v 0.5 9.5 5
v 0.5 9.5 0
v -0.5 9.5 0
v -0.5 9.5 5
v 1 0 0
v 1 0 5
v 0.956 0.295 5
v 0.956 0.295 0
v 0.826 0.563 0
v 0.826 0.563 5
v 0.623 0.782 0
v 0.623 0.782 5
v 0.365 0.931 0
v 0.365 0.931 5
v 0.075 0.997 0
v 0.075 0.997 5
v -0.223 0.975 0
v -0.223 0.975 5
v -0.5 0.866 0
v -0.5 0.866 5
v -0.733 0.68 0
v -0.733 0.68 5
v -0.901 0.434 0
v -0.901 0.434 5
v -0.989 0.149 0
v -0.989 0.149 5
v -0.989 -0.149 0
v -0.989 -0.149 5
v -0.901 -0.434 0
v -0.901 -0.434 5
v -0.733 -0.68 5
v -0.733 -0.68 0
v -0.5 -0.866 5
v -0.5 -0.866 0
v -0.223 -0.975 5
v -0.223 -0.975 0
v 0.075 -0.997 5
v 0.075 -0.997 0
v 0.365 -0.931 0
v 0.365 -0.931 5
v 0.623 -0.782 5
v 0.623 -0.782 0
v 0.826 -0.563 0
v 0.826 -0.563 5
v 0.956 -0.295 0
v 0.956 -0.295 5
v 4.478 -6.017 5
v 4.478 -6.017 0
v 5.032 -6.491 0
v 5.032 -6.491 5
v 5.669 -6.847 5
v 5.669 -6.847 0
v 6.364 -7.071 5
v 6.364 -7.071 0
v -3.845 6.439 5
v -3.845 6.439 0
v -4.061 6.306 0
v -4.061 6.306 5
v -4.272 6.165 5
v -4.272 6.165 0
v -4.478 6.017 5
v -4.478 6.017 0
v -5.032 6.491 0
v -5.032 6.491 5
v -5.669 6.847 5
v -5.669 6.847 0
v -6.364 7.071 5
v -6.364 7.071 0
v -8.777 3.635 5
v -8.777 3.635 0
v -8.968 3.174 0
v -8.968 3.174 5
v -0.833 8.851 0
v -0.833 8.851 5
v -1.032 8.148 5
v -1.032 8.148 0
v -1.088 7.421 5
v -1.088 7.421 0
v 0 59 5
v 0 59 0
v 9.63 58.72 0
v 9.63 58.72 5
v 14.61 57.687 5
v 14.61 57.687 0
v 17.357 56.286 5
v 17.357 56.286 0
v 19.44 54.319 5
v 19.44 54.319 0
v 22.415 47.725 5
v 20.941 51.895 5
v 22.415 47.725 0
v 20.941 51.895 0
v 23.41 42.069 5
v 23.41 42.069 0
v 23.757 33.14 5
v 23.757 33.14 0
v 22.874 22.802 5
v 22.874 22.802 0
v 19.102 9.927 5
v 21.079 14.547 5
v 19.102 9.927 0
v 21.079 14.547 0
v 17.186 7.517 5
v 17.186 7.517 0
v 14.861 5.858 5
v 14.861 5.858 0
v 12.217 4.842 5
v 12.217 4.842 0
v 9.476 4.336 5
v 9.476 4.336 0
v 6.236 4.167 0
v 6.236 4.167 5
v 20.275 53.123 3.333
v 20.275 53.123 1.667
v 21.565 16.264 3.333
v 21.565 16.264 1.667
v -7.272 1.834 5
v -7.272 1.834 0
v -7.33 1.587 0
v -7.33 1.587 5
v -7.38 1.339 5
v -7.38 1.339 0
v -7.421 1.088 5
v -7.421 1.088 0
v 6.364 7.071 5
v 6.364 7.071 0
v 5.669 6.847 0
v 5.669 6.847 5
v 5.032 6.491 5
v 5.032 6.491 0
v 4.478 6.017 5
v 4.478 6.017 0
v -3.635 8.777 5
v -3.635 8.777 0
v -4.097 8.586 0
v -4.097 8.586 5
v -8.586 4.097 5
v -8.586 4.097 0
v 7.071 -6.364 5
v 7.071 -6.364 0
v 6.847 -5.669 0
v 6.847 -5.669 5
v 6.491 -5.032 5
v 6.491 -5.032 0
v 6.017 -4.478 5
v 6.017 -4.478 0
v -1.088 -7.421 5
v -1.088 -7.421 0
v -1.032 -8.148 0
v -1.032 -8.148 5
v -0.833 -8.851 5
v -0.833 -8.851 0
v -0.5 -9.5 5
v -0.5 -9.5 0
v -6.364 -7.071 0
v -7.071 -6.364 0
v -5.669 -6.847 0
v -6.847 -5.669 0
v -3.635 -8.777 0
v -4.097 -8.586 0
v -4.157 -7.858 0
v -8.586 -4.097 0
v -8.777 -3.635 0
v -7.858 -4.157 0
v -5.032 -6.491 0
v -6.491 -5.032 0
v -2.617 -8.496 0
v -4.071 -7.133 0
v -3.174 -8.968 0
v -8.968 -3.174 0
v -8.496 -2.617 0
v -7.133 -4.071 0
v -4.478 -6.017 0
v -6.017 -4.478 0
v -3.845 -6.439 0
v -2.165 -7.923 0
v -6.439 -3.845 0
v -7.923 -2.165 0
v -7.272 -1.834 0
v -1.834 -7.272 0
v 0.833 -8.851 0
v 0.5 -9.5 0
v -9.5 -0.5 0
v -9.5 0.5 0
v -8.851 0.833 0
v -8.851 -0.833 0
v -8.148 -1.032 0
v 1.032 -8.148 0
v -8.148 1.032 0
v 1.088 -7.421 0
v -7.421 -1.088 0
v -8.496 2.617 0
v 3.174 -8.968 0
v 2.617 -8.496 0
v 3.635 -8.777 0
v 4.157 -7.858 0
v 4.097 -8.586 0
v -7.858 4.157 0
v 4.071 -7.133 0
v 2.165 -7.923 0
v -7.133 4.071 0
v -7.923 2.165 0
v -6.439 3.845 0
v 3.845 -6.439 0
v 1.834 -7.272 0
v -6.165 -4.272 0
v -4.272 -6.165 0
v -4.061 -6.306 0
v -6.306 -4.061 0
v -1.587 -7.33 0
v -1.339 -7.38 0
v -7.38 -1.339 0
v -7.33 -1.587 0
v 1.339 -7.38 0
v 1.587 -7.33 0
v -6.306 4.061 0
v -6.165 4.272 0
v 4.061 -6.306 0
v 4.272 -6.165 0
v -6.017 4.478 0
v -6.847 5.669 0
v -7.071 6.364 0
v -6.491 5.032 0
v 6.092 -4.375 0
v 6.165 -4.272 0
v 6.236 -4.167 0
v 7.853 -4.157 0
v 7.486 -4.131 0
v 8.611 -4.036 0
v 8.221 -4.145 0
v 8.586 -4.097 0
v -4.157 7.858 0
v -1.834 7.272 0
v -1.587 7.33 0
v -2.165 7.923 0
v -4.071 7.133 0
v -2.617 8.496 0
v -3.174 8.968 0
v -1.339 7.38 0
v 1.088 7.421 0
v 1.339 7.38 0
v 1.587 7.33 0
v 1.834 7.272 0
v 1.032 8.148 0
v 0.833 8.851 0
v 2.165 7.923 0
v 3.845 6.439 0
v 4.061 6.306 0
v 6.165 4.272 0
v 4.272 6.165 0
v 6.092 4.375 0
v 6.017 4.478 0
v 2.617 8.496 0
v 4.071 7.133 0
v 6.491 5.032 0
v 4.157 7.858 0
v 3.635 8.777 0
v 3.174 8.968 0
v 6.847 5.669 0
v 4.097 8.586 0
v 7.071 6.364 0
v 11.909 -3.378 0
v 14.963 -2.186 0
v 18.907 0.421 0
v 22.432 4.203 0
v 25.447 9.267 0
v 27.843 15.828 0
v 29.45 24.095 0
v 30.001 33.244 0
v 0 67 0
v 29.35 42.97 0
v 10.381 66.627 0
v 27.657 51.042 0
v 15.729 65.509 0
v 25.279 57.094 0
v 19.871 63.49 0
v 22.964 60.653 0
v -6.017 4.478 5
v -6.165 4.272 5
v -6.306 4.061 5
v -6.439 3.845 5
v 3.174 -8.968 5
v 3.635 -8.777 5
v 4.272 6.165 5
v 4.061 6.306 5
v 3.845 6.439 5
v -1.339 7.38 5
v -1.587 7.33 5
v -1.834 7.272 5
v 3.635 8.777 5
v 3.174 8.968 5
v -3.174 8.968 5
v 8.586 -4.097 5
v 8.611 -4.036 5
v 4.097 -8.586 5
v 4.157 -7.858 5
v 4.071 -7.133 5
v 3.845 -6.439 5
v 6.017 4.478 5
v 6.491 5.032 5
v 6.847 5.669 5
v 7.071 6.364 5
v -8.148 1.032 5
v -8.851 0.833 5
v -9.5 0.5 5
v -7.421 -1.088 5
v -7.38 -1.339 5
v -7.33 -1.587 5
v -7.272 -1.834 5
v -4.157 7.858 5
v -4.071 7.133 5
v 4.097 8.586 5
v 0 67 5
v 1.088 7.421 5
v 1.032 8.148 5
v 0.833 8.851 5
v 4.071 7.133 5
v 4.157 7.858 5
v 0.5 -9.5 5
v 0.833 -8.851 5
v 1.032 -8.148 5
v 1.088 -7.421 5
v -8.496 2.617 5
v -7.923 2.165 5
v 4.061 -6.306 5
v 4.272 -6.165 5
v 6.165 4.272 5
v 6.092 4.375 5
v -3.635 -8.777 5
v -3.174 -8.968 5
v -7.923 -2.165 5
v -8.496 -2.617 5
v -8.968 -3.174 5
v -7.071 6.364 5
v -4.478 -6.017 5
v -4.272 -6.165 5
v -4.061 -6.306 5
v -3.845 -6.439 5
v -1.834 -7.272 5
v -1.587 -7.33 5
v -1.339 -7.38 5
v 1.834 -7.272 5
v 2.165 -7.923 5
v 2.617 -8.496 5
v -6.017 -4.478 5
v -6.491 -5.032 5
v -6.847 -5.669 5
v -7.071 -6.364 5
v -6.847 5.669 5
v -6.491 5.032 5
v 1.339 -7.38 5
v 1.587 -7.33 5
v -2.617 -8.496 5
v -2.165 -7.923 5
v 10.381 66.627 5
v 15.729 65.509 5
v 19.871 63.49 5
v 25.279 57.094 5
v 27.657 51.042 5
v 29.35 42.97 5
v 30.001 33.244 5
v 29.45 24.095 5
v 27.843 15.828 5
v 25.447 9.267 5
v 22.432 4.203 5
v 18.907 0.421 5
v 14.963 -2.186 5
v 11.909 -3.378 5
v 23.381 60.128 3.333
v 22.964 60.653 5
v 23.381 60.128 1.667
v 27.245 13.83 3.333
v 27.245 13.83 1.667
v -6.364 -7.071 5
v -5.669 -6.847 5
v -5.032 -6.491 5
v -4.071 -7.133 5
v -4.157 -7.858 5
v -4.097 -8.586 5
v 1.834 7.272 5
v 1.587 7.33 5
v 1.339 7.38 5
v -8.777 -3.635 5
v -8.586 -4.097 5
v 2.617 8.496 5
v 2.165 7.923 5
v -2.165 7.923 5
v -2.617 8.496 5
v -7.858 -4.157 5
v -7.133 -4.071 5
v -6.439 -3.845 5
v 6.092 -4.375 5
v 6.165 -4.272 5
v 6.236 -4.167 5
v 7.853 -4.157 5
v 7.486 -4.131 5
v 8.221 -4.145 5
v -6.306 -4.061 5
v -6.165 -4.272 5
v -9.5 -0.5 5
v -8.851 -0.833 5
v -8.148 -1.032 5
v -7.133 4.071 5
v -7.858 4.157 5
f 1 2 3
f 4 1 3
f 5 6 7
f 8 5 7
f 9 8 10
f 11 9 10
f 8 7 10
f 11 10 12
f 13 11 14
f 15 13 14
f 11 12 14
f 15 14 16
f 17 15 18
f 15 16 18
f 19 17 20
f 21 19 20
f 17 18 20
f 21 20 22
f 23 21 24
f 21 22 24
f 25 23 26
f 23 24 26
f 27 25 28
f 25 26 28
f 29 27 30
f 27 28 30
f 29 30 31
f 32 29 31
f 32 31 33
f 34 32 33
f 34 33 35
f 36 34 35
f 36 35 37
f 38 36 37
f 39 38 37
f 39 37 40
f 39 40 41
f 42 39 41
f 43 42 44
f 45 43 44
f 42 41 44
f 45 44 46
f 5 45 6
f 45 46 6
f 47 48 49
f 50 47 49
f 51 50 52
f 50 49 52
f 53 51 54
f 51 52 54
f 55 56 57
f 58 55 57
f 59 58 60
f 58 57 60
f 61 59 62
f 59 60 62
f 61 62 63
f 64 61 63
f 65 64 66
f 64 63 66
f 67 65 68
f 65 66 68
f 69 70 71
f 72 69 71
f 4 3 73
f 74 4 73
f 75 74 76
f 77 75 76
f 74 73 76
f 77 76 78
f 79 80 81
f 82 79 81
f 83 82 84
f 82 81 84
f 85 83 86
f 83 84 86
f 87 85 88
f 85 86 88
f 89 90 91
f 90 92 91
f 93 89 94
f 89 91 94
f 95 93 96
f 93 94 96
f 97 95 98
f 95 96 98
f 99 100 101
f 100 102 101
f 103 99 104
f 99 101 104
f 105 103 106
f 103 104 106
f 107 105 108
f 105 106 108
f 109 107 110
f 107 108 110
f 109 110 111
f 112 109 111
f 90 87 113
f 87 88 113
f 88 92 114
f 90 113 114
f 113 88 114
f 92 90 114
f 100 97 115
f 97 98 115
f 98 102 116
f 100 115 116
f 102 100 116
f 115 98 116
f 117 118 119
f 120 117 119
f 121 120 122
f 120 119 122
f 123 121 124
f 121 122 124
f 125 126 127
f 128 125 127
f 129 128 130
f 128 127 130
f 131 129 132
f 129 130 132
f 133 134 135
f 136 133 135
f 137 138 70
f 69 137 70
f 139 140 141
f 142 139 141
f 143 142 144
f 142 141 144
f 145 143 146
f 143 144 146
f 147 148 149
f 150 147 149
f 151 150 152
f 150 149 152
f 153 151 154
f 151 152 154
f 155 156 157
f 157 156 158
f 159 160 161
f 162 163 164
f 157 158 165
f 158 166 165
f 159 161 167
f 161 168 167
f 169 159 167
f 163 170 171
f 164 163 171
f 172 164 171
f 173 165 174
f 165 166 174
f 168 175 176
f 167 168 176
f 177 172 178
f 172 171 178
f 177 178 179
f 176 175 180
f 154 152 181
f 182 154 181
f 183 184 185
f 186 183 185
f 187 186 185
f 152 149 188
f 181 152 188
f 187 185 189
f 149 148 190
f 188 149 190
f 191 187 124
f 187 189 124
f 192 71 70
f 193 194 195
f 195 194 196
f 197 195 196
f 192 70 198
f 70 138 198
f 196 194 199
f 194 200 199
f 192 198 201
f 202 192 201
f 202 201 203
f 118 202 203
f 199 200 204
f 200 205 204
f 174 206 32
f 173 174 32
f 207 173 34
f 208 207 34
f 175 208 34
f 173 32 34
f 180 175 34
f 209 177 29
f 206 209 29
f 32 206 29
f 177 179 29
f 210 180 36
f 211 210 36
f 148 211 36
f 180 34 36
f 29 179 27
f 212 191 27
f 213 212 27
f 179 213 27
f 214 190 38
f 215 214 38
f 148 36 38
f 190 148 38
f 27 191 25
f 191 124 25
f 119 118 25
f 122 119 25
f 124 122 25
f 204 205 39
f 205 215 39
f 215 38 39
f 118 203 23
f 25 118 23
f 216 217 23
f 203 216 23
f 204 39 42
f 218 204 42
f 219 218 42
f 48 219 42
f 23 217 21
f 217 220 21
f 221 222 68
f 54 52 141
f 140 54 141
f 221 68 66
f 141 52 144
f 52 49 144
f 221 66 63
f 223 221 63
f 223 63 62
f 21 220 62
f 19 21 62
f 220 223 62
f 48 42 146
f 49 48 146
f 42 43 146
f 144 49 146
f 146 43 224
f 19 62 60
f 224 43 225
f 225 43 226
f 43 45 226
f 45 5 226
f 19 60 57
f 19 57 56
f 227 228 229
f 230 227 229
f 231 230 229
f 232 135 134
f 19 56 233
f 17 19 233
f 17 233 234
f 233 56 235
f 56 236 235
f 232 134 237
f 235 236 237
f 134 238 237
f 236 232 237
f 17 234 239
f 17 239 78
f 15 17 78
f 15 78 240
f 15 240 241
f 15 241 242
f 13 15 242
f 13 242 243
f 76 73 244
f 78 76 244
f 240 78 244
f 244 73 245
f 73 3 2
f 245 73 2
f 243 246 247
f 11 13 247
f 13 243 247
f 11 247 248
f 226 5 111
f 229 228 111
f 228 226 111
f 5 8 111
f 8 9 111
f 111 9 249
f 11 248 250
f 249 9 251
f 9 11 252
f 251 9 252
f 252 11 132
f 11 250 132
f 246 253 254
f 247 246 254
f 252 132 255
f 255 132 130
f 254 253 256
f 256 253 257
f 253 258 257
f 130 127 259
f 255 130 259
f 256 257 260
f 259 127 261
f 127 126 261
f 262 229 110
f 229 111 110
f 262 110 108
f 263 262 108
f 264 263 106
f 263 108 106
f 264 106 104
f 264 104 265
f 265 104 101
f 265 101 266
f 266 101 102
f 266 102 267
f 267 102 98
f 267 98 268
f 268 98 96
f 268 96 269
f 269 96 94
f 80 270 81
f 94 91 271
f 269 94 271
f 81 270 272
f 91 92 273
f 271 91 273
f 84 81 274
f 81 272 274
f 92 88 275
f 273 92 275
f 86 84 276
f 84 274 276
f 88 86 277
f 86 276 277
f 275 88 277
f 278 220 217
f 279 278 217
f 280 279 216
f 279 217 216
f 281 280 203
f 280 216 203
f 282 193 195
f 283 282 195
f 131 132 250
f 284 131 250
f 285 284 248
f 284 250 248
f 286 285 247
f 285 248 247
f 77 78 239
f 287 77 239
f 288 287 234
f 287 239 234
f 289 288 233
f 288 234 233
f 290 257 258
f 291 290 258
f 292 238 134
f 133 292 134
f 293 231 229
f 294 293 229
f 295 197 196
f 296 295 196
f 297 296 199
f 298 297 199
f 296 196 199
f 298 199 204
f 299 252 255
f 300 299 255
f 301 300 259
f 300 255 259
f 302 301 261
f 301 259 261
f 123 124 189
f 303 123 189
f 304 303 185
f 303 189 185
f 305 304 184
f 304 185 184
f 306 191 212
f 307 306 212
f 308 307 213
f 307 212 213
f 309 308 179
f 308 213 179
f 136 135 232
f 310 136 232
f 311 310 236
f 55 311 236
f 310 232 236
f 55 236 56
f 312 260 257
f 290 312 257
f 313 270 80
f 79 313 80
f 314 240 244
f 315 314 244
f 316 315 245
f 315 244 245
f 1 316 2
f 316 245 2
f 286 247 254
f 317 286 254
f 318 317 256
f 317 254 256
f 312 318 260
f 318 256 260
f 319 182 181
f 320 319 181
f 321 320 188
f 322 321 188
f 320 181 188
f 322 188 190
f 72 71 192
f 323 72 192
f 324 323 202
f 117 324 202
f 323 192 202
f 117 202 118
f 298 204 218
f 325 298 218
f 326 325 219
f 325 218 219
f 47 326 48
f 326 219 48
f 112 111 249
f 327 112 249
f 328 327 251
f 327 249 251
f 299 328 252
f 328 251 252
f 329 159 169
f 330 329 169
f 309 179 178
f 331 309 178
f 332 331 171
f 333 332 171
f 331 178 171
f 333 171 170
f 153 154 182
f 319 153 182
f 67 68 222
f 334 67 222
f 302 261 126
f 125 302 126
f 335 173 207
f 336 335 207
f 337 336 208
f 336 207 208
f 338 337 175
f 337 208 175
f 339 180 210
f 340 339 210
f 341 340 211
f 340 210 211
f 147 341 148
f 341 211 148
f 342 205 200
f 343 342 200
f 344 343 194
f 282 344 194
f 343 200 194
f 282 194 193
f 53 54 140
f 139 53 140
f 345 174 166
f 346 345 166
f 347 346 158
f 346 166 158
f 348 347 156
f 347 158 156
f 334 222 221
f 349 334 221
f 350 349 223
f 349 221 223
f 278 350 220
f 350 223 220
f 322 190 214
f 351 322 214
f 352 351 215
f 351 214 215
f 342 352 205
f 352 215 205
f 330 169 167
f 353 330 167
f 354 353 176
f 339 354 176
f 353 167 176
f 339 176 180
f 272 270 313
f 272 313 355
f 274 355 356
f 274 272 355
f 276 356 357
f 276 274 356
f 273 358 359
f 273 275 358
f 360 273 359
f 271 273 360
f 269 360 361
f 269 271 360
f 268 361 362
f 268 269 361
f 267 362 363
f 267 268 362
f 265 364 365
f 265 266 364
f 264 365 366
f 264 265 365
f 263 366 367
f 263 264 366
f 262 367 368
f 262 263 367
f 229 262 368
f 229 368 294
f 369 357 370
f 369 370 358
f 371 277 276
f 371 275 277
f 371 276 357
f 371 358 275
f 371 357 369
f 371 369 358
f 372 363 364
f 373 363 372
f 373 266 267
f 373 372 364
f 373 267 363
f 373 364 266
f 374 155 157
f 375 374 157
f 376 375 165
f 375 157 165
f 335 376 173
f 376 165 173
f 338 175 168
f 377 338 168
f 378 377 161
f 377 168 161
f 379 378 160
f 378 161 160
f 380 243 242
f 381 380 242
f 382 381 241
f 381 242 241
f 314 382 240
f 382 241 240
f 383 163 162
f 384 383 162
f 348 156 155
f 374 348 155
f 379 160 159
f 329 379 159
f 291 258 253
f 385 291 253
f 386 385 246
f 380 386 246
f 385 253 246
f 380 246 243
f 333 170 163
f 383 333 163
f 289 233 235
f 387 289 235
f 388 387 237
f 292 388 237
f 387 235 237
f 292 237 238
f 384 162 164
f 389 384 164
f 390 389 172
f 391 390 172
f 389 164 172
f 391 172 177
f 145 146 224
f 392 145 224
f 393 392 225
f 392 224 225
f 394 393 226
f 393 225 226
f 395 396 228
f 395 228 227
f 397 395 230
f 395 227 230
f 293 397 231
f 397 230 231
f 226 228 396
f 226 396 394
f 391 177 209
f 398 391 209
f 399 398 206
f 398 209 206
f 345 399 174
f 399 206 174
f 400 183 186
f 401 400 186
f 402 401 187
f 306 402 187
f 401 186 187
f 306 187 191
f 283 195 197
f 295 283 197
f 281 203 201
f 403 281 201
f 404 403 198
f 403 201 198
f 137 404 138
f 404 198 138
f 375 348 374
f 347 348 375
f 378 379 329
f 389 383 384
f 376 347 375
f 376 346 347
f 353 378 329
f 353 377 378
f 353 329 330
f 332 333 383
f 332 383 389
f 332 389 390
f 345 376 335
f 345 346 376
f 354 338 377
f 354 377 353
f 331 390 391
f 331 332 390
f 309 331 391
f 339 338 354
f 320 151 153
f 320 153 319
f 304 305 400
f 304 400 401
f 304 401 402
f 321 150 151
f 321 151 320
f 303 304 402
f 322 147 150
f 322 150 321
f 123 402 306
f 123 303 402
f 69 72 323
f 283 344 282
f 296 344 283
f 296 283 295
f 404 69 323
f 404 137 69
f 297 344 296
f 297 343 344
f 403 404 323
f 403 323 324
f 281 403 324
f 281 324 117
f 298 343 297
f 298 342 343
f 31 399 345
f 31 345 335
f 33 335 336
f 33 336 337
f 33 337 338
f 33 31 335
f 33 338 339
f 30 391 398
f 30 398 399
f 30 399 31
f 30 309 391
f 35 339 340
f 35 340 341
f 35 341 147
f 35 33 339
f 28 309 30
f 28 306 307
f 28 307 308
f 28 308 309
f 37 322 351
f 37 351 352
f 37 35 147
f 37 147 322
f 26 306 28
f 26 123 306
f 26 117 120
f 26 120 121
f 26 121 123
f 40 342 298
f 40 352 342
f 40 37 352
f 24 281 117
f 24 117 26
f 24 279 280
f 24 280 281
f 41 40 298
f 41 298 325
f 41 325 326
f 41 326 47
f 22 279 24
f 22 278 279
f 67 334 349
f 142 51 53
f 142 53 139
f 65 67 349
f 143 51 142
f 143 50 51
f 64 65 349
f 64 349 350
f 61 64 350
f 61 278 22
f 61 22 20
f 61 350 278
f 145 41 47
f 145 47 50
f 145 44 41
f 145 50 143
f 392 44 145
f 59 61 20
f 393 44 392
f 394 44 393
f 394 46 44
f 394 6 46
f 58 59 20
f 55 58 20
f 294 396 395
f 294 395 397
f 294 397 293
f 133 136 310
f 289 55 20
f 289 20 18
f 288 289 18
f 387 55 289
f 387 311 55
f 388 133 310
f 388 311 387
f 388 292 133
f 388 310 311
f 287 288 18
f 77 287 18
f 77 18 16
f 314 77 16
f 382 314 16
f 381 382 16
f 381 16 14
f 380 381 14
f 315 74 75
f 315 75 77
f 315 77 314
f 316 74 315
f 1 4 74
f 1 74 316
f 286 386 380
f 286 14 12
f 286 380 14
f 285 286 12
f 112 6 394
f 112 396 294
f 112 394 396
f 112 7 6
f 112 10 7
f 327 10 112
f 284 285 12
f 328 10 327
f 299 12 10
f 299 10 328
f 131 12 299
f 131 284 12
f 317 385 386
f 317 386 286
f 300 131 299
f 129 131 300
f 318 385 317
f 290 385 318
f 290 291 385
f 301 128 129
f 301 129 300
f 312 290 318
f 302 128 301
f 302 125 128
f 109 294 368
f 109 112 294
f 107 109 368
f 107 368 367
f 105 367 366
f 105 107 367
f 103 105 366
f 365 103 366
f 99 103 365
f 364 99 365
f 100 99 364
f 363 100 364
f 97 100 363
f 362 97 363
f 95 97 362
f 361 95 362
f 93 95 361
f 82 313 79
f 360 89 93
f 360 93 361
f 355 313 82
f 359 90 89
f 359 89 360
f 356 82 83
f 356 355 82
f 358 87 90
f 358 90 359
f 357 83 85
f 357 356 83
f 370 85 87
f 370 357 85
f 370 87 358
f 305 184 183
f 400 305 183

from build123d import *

# Parameters (mm, degrees)
F1_DEPTH = 5
F2_R     = 1
F3_DEPTH = 5
F5_DEPTH = 5


with BuildPart() as f1:
    # F0 (on Top) → F1 (new body)
    with BuildSketch(Plane.XY):
        with BuildLine():
            ThreePointArc((7.4206173165, -1.0883191822), (7.4801280027, -0.5456052265), (7.5, 0))
            ThreePointArc((7.5, 0), (7.4801280027, 0.5456052265), (7.4206173165, 1.0883191822))
            ThreePointArc((7.4206173165, 1.0883191822), (7.355889603, 1.4631774151), (7.2722381774, 1.8342714877))
            ThreePointArc((7.2722381774, 1.8342714877), (6.9290964938, 2.8701257427), (6.4392747372, 3.8452231222))
            ThreePointArc((6.4392747372, 3.8452231222), (6.2360220923, 4.1667767476), (6.0167266989, 4.4776109513))
            ThreePointArc((6.0167266989, 4.4776109513), (5.3033008589, 5.3033008589), (4.4776109513, 6.0167266989))
            ThreePointArc((4.4776109513, 6.0167266989), (4.1667767476, 6.2360220923), (3.8452231222, 6.4392747372))
            ThreePointArc((3.8452231222, 6.4392747372), (2.8701257427, 6.9290964938), (1.8342714877, 7.2722381774))
            ThreePointArc((1.8342714877, 7.2722381774), (1.4631774151, 7.355889603), (1.0883191822, 7.4206173165))
            ThreePointArc((1.0883191822, 7.4206173165), (0.5456052265, 7.4801280027), (0, 7.5))
            ThreePointArc((0, 7.5), (-0.5456052265, 7.4801280027), (-1.0883191822, 7.4206173165))
            ThreePointArc((-1.0883191822, 7.4206173165), (-1.4631774151, 7.355889603), (-1.8342714877, 7.2722381774))
            ThreePointArc((-1.8342714877, 7.2722381774), (-2.8701257427, 6.9290964938), (-3.8452231222, 6.4392747372))
            ThreePointArc((-3.8452231222, 6.4392747372), (-4.1667767476, 6.2360220923), (-4.4776109513, 6.0167266989))
            ThreePointArc((-4.4776109513, 6.0167266989), (-5.3033008589, 5.3033008589), (-6.0167266989, 4.4776109513))
            ThreePointArc((-6.0167266989, 4.4776109513), (-6.2360220923, 4.1667767476), (-6.4392747372, 3.8452231222))
            ThreePointArc((-6.4392747372, 3.8452231222), (-6.9290964938, 2.8701257427), (-7.2722381774, 1.8342714877))
            ThreePointArc((-7.2722381774, 1.8342714877), (-7.355889603, 1.4631774151), (-7.4206173165, 1.0883191822))
            ThreePointArc((-7.4206173165, 1.0883191822), (-7.5, 0), (-7.4206173165, -1.0883191822))
            ThreePointArc((-7.4206173165, -1.0883191822), (-7.355889603, -1.4631774151), (-7.2722381774, -1.8342714877))
            ThreePointArc((-7.2722381774, -1.8342714877), (-6.9290964938, -2.8701257427), (-6.4392747372, -3.8452231222))
            ThreePointArc((-6.4392747372, -3.8452231222), (-6.2360220923, -4.1667767476), (-6.0167266989, -4.4776109513))
            ThreePointArc((-6.0167266989, -4.4776109513), (-5.3033008589, -5.3033008589), (-4.4776109513, -6.0167266989))
            ThreePointArc((-4.4776109513, -6.0167266989), (-4.1667767476, -6.2360220923), (-3.8452231222, -6.4392747372))
            ThreePointArc((-3.8452231222, -6.4392747372), (-2.8701257427, -6.9290964938), (-1.8342714877, -7.2722381774))
            ThreePointArc((-1.8342714877, -7.2722381774), (-1.4631774151, -7.355889603), (-1.0883191822, -7.4206173165))
            ThreePointArc((-1.0883191822, -7.4206173165), (0, -7.5), (1.0883191822, -7.4206173165))
            ThreePointArc((1.0883191822, -7.4206173165), (1.4631774151, -7.355889603), (1.8342714877, -7.2722381774))
            ThreePointArc((1.8342714877, -7.2722381774), (2.8701257427, -6.9290964938), (3.8452231222, -6.4392747372))
            ThreePointArc((3.8452231222, -6.4392747372), (4.1667767476, -6.2360220923), (4.4776109513, -6.0167266989))
            ThreePointArc((4.4776109513, -6.0167266989), (5.3033008589, -5.3033008589), (6.0167266989, -4.4776109513))
            ThreePointArc((6.0167266989, -4.4776109513), (6.2360220923, -4.1667767476), (6.4392747372, -3.8452231222))
            ThreePointArc((6.4392747372, -3.8452231222), (6.9290964938, -2.8701257427), (7.2722381774, -1.8342714877))
            ThreePointArc((7.2722381774, -1.8342714877), (7.355889603, -1.4631774151), (7.4206173165, -1.0883191822))
        make_face()
        with BuildLine():
            ThreePointArc((0.5, -9.5), (0.9498278009, -8.5043518229), (1.0883191822, -7.4206173165))
            ThreePointArc((1.0883191822, -7.4206173165), (0, -7.5), (-1.0883191822, -7.4206173165))
            ThreePointArc((-1.0883191822, -7.4206173165), (-0.9498278009, -8.5043518229), (-0.5, -9.5))
            Line((-0.5, -9.5), (0, -9.5))
            Line((0, -9.5), (0.5, -9.5))
        make_face()
        with BuildLine():
            ThreePointArc((4.0974323737, -8.5855138427), (4.1320010103, -7.4935132234), (3.8452231222, -6.4392747372))
            ThreePointArc((3.8452231222, -6.4392747372), (2.8701257427, -6.9290964938), (1.8342714877, -7.2722381774))
            ThreePointArc((1.8342714877, -7.2722381774), (2.376948081, -8.2204799494), (3.1735528412, -8.968197275))
            Line((3.1735528412, -8.968197275), (3.6354926075, -8.7768555589))
            Line((3.6354926075, -8.7768555589), (4.0974323737, -8.5855138427))
        make_face()
        with BuildLine():
            ThreePointArc((8.968197275, -3.1735528412), (8.2204799494, -2.376948081), (7.2722381774, -1.8342714877))
            ThreePointArc((7.2722381774, -1.8342714877), (6.9290964938, -2.8701257427), (6.4392747372, -3.8452231222))
            ThreePointArc((6.4392747372, -3.8452231222), (7.4935132234, -4.1320010103), (8.5855138427, -4.0974323737))
            Line((8.5855138427, -4.0974323737), (8.7768555589, -3.6354926075))
            Line((8.7768555589, -3.6354926075), (8.968197275, -3.1735528412))
        make_face()
        with BuildLine():
            ThreePointArc((7.4206173165, 1.0883191822), (7.4801280027, 0.5456052265), (7.5, 0))
            ThreePointArc((7.5, 0), (7.4801280027, -0.5456052265), (7.4206173165, -1.0883191822))
            ThreePointArc((7.4206173165, -1.0883191822), (8.5043518229, -0.9498278009), (9.5, -0.5))
            Line((9.5, -0.5), (9.5, 0))
            Line((9.5, 0), (9.5, 0.5))
            ThreePointArc((9.5, 0.5), (8.5043518229, 0.9498278009), (7.4206173165, 1.0883191822))
        make_face()
        with BuildLine():
            ThreePointArc((7.0710678119, -6.3639610307), (6.6851145225, -5.3418551646), (6.0167266989, -4.4776109513))
            ThreePointArc((6.0167266989, -4.4776109513), (5.3033008589, -5.3033008589), (4.4776109513, -6.0167266989))
            ThreePointArc((4.4776109513, -6.0167266989), (5.3418551646, -6.6851145225), (6.3639610307, -7.0710678119))
            Line((6.3639610307, -7.0710678119), (6.7175144213, -6.7175144213))
            Line((6.7175144213, -6.7175144213), (7.0710678119, -6.3639610307))
        make_face()
        with BuildLine():
            ThreePointArc((6.4392747372, 3.8452231222), (6.9290964938, 2.8701257427), (7.2722381774, 1.8342714877))
            ThreePointArc((7.2722381774, 1.8342714877), (8.2204799494, 2.376948081), (8.968197275, 3.1735528412))
            Line((8.968197275, 3.1735528412), (8.7768555589, 3.6354926075))
            Line((8.7768555589, 3.6354926075), (8.5855138427, 4.0974323737))
            ThreePointArc((8.5855138427, 4.0974323737), (7.4935132234, 4.1320010103), (6.4392747372, 3.8452231222))
        make_face()
        with BuildLine():
            ThreePointArc((4.4776109513, 6.0167266989), (5.3033008589, 5.3033008589), (6.0167266989, 4.4776109513))
            ThreePointArc((6.0167266989, 4.4776109513), (6.6851145225, 5.3418551646), (7.0710678119, 6.3639610307))
            Line((7.0710678119, 6.3639610307), (6.7175144213, 6.7175144213))
            Line((6.7175144213, 6.7175144213), (6.3639610307, 7.0710678119))
            ThreePointArc((6.3639610307, 7.0710678119), (5.3418551646, 6.6851145225), (4.4776109513, 6.0167266989))
        make_face()
        with BuildLine():
            ThreePointArc((1.8342714877, 7.2722381774), (2.8701257427, 6.9290964938), (3.8452231222, 6.4392747372))
            ThreePointArc((3.8452231222, 6.4392747372), (4.1320010103, 7.4935132234), (4.0974323737, 8.5855138427))
            Line((4.0974323737, 8.5855138427), (3.6354926075, 8.7768555589))
            Line((3.6354926075, 8.7768555589), (3.1735528412, 8.968197275))
            ThreePointArc((3.1735528412, 8.968197275), (2.376948081, 8.2204799494), (1.8342714877, 7.2722381774))
        make_face()
        with BuildLine():
            ThreePointArc((-3.1735528412, -8.968197275), (-2.376948081, -8.2204799494), (-1.8342714877, -7.2722381774))
            ThreePointArc((-1.8342714877, -7.2722381774), (-2.8701257427, -6.9290964938), (-3.8452231222, -6.4392747372))
            ThreePointArc((-3.8452231222, -6.4392747372), (-4.1320010103, -7.4935132234), (-4.0974323737, -8.5855138427))
            Line((-4.0974323737, -8.5855138427), (-3.6354926075, -8.7768555589))
            Line((-3.6354926075, -8.7768555589), (-3.1735528412, -8.968197275))
        make_face()
        with BuildLine():
            ThreePointArc((-6.3639610307, -7.0710678119), (-5.3418551646, -6.6851145225), (-4.4776109513, -6.0167266989))
            ThreePointArc((-4.4776109513, -6.0167266989), (-5.3033008589, -5.3033008589), (-6.0167266989, -4.4776109513))
            ThreePointArc((-6.0167266989, -4.4776109513), (-6.6851145225, -5.3418551646), (-7.0710678119, -6.3639610307))
            Line((-7.0710678119, -6.3639610307), (-6.7175144213, -6.7175144213))
            Line((-6.7175144213, -6.7175144213), (-6.3639610307, -7.0710678119))
        make_face()
        with BuildLine():
            ThreePointArc((-8.5855138427, -4.0974323737), (-7.4935132234, -4.1320010103), (-6.4392747372, -3.8452231222))
            ThreePointArc((-6.4392747372, -3.8452231222), (-6.9290964938, -2.8701257427), (-7.2722381774, -1.8342714877))
            ThreePointArc((-7.2722381774, -1.8342714877), (-8.2204799494, -2.376948081), (-8.968197275, -3.1735528412))
            Line((-8.968197275, -3.1735528412), (-8.7768555589, -3.6354926075))
            Line((-8.7768555589, -3.6354926075), (-8.5855138427, -4.0974323737))
        make_face()
        with BuildLine():
            ThreePointArc((-9.5, -0.5), (-8.5043518229, -0.9498278009), (-7.4206173165, -1.0883191822))
            ThreePointArc((-7.4206173165, -1.0883191822), (-7.5, 0), (-7.4206173165, 1.0883191822))
            ThreePointArc((-7.4206173165, 1.0883191822), (-8.5043518229, 0.9498278009), (-9.5, 0.5))
            Line((-9.5, 0.5), (-9.5, 0))
            Line((-9.5, 0), (-9.5, -0.5))
        make_face()
        with BuildLine():
            ThreePointArc((-7.2722381774, 1.8342714877), (-6.9290964938, 2.8701257427), (-6.4392747372, 3.8452231222))
            ThreePointArc((-6.4392747372, 3.8452231222), (-7.4935132234, 4.1320010103), (-8.5855138427, 4.0974323737))
            Line((-8.5855138427, 4.0974323737), (-8.7768555589, 3.6354926075))
            Line((-8.7768555589, 3.6354926075), (-8.968197275, 3.1735528412))
            ThreePointArc((-8.968197275, 3.1735528412), (-8.2204799494, 2.376948081), (-7.2722381774, 1.8342714877))
        make_face()
        with BuildLine():
            ThreePointArc((-6.0167266989, 4.4776109513), (-5.3033008589, 5.3033008589), (-4.4776109513, 6.0167266989))
            ThreePointArc((-4.4776109513, 6.0167266989), (-5.3418551646, 6.6851145225), (-6.3639610307, 7.0710678119))
            Line((-6.3639610307, 7.0710678119), (-6.7175144213, 6.7175144213))
            Line((-6.7175144213, 6.7175144213), (-7.0710678119, 6.3639610307))
            ThreePointArc((-7.0710678119, 6.3639610307), (-6.6851145225, 5.3418551646), (-6.0167266989, 4.4776109513))
        make_face()
        with BuildLine():
            ThreePointArc((-3.8452231222, 6.4392747372), (-2.8701257427, 6.9290964938), (-1.8342714877, 7.2722381774))
            ThreePointArc((-1.8342714877, 7.2722381774), (-2.376948081, 8.2204799494), (-3.1735528412, 8.968197275))
            Line((-3.1735528412, 8.968197275), (-3.6354926075, 8.7768555589))
            Line((-3.6354926075, 8.7768555589), (-4.0974323737, 8.5855138427))
            ThreePointArc((-4.0974323737, 8.5855138427), (-4.1320010103, 7.4935132234), (-3.8452231222, 6.4392747372))
        make_face()
        with BuildLine():
            ThreePointArc((-1.0883191822, 7.4206173165), (-0.5456052265, 7.4801280027), (0, 7.5))
            Line((0, 7.5), (0, 9.5))
            Line((0, 9.5), (-0.5, 9.5))
            ThreePointArc((-0.5, 9.5), (-0.9498278009, 8.5043518229), (-1.0883191822, 7.4206173165))
        make_face()
        with BuildLine():
            ThreePointArc((0, 7.5), (0.5456052265, 7.4801280027), (1.0883191822, 7.4206173165))
            ThreePointArc((1.0883191822, 7.4206173165), (0.9498278009, 8.5043518229), (0.5, 9.5))
            Line((0.5, 9.5), (0, 9.5))
            Line((0, 9.5), (0, 7.5))
        make_face()
    extrude(amount=F1_DEPTH)

    # F2 (on face) → F3 (cut)
    with BuildSketch(Plane.XY.offset(5)):
        Circle(F2_R)
    extrude(amount=-F3_DEPTH, mode=Mode.SUBTRACT)

    # F4 (on Top) → F5 (join, through all)
    with BuildSketch(Plane.XY):
        with BuildLine():
            Line((0, 67), (0, 59))
            add(Edge.make_bspline(
                [(0, 59), (10, 59), (25.4993254548, 59.0468729188), (23.9657868474, 14.0021486097), (16.2360220923, 4.1667767476), (6.2360220923, 4.1667767476)],
                knots=[0, 0, 0, 0, 0.3045418083, 0.7070898322, 1, 1, 1, 1], degree=3))
            Line((6.2360220923, 4.1667767476), (6.2360220923, -4.1667767476))
            add(Edge.make_bspline(
                [(0, 67), (10, 67), (29.5010820231, 66.8559685475), (33.105016404, 11.2567361372), (16.2360220923, -4.1667767476), (6.2360220923, -4.1667767476)],
                knots=[0, 0, 0, 0, 0.2901796827, 0.6908356956, 1, 1, 1, 1], degree=3))
        make_face()
    extrude(amount=F5_DEPTH)


solid = f1.part
